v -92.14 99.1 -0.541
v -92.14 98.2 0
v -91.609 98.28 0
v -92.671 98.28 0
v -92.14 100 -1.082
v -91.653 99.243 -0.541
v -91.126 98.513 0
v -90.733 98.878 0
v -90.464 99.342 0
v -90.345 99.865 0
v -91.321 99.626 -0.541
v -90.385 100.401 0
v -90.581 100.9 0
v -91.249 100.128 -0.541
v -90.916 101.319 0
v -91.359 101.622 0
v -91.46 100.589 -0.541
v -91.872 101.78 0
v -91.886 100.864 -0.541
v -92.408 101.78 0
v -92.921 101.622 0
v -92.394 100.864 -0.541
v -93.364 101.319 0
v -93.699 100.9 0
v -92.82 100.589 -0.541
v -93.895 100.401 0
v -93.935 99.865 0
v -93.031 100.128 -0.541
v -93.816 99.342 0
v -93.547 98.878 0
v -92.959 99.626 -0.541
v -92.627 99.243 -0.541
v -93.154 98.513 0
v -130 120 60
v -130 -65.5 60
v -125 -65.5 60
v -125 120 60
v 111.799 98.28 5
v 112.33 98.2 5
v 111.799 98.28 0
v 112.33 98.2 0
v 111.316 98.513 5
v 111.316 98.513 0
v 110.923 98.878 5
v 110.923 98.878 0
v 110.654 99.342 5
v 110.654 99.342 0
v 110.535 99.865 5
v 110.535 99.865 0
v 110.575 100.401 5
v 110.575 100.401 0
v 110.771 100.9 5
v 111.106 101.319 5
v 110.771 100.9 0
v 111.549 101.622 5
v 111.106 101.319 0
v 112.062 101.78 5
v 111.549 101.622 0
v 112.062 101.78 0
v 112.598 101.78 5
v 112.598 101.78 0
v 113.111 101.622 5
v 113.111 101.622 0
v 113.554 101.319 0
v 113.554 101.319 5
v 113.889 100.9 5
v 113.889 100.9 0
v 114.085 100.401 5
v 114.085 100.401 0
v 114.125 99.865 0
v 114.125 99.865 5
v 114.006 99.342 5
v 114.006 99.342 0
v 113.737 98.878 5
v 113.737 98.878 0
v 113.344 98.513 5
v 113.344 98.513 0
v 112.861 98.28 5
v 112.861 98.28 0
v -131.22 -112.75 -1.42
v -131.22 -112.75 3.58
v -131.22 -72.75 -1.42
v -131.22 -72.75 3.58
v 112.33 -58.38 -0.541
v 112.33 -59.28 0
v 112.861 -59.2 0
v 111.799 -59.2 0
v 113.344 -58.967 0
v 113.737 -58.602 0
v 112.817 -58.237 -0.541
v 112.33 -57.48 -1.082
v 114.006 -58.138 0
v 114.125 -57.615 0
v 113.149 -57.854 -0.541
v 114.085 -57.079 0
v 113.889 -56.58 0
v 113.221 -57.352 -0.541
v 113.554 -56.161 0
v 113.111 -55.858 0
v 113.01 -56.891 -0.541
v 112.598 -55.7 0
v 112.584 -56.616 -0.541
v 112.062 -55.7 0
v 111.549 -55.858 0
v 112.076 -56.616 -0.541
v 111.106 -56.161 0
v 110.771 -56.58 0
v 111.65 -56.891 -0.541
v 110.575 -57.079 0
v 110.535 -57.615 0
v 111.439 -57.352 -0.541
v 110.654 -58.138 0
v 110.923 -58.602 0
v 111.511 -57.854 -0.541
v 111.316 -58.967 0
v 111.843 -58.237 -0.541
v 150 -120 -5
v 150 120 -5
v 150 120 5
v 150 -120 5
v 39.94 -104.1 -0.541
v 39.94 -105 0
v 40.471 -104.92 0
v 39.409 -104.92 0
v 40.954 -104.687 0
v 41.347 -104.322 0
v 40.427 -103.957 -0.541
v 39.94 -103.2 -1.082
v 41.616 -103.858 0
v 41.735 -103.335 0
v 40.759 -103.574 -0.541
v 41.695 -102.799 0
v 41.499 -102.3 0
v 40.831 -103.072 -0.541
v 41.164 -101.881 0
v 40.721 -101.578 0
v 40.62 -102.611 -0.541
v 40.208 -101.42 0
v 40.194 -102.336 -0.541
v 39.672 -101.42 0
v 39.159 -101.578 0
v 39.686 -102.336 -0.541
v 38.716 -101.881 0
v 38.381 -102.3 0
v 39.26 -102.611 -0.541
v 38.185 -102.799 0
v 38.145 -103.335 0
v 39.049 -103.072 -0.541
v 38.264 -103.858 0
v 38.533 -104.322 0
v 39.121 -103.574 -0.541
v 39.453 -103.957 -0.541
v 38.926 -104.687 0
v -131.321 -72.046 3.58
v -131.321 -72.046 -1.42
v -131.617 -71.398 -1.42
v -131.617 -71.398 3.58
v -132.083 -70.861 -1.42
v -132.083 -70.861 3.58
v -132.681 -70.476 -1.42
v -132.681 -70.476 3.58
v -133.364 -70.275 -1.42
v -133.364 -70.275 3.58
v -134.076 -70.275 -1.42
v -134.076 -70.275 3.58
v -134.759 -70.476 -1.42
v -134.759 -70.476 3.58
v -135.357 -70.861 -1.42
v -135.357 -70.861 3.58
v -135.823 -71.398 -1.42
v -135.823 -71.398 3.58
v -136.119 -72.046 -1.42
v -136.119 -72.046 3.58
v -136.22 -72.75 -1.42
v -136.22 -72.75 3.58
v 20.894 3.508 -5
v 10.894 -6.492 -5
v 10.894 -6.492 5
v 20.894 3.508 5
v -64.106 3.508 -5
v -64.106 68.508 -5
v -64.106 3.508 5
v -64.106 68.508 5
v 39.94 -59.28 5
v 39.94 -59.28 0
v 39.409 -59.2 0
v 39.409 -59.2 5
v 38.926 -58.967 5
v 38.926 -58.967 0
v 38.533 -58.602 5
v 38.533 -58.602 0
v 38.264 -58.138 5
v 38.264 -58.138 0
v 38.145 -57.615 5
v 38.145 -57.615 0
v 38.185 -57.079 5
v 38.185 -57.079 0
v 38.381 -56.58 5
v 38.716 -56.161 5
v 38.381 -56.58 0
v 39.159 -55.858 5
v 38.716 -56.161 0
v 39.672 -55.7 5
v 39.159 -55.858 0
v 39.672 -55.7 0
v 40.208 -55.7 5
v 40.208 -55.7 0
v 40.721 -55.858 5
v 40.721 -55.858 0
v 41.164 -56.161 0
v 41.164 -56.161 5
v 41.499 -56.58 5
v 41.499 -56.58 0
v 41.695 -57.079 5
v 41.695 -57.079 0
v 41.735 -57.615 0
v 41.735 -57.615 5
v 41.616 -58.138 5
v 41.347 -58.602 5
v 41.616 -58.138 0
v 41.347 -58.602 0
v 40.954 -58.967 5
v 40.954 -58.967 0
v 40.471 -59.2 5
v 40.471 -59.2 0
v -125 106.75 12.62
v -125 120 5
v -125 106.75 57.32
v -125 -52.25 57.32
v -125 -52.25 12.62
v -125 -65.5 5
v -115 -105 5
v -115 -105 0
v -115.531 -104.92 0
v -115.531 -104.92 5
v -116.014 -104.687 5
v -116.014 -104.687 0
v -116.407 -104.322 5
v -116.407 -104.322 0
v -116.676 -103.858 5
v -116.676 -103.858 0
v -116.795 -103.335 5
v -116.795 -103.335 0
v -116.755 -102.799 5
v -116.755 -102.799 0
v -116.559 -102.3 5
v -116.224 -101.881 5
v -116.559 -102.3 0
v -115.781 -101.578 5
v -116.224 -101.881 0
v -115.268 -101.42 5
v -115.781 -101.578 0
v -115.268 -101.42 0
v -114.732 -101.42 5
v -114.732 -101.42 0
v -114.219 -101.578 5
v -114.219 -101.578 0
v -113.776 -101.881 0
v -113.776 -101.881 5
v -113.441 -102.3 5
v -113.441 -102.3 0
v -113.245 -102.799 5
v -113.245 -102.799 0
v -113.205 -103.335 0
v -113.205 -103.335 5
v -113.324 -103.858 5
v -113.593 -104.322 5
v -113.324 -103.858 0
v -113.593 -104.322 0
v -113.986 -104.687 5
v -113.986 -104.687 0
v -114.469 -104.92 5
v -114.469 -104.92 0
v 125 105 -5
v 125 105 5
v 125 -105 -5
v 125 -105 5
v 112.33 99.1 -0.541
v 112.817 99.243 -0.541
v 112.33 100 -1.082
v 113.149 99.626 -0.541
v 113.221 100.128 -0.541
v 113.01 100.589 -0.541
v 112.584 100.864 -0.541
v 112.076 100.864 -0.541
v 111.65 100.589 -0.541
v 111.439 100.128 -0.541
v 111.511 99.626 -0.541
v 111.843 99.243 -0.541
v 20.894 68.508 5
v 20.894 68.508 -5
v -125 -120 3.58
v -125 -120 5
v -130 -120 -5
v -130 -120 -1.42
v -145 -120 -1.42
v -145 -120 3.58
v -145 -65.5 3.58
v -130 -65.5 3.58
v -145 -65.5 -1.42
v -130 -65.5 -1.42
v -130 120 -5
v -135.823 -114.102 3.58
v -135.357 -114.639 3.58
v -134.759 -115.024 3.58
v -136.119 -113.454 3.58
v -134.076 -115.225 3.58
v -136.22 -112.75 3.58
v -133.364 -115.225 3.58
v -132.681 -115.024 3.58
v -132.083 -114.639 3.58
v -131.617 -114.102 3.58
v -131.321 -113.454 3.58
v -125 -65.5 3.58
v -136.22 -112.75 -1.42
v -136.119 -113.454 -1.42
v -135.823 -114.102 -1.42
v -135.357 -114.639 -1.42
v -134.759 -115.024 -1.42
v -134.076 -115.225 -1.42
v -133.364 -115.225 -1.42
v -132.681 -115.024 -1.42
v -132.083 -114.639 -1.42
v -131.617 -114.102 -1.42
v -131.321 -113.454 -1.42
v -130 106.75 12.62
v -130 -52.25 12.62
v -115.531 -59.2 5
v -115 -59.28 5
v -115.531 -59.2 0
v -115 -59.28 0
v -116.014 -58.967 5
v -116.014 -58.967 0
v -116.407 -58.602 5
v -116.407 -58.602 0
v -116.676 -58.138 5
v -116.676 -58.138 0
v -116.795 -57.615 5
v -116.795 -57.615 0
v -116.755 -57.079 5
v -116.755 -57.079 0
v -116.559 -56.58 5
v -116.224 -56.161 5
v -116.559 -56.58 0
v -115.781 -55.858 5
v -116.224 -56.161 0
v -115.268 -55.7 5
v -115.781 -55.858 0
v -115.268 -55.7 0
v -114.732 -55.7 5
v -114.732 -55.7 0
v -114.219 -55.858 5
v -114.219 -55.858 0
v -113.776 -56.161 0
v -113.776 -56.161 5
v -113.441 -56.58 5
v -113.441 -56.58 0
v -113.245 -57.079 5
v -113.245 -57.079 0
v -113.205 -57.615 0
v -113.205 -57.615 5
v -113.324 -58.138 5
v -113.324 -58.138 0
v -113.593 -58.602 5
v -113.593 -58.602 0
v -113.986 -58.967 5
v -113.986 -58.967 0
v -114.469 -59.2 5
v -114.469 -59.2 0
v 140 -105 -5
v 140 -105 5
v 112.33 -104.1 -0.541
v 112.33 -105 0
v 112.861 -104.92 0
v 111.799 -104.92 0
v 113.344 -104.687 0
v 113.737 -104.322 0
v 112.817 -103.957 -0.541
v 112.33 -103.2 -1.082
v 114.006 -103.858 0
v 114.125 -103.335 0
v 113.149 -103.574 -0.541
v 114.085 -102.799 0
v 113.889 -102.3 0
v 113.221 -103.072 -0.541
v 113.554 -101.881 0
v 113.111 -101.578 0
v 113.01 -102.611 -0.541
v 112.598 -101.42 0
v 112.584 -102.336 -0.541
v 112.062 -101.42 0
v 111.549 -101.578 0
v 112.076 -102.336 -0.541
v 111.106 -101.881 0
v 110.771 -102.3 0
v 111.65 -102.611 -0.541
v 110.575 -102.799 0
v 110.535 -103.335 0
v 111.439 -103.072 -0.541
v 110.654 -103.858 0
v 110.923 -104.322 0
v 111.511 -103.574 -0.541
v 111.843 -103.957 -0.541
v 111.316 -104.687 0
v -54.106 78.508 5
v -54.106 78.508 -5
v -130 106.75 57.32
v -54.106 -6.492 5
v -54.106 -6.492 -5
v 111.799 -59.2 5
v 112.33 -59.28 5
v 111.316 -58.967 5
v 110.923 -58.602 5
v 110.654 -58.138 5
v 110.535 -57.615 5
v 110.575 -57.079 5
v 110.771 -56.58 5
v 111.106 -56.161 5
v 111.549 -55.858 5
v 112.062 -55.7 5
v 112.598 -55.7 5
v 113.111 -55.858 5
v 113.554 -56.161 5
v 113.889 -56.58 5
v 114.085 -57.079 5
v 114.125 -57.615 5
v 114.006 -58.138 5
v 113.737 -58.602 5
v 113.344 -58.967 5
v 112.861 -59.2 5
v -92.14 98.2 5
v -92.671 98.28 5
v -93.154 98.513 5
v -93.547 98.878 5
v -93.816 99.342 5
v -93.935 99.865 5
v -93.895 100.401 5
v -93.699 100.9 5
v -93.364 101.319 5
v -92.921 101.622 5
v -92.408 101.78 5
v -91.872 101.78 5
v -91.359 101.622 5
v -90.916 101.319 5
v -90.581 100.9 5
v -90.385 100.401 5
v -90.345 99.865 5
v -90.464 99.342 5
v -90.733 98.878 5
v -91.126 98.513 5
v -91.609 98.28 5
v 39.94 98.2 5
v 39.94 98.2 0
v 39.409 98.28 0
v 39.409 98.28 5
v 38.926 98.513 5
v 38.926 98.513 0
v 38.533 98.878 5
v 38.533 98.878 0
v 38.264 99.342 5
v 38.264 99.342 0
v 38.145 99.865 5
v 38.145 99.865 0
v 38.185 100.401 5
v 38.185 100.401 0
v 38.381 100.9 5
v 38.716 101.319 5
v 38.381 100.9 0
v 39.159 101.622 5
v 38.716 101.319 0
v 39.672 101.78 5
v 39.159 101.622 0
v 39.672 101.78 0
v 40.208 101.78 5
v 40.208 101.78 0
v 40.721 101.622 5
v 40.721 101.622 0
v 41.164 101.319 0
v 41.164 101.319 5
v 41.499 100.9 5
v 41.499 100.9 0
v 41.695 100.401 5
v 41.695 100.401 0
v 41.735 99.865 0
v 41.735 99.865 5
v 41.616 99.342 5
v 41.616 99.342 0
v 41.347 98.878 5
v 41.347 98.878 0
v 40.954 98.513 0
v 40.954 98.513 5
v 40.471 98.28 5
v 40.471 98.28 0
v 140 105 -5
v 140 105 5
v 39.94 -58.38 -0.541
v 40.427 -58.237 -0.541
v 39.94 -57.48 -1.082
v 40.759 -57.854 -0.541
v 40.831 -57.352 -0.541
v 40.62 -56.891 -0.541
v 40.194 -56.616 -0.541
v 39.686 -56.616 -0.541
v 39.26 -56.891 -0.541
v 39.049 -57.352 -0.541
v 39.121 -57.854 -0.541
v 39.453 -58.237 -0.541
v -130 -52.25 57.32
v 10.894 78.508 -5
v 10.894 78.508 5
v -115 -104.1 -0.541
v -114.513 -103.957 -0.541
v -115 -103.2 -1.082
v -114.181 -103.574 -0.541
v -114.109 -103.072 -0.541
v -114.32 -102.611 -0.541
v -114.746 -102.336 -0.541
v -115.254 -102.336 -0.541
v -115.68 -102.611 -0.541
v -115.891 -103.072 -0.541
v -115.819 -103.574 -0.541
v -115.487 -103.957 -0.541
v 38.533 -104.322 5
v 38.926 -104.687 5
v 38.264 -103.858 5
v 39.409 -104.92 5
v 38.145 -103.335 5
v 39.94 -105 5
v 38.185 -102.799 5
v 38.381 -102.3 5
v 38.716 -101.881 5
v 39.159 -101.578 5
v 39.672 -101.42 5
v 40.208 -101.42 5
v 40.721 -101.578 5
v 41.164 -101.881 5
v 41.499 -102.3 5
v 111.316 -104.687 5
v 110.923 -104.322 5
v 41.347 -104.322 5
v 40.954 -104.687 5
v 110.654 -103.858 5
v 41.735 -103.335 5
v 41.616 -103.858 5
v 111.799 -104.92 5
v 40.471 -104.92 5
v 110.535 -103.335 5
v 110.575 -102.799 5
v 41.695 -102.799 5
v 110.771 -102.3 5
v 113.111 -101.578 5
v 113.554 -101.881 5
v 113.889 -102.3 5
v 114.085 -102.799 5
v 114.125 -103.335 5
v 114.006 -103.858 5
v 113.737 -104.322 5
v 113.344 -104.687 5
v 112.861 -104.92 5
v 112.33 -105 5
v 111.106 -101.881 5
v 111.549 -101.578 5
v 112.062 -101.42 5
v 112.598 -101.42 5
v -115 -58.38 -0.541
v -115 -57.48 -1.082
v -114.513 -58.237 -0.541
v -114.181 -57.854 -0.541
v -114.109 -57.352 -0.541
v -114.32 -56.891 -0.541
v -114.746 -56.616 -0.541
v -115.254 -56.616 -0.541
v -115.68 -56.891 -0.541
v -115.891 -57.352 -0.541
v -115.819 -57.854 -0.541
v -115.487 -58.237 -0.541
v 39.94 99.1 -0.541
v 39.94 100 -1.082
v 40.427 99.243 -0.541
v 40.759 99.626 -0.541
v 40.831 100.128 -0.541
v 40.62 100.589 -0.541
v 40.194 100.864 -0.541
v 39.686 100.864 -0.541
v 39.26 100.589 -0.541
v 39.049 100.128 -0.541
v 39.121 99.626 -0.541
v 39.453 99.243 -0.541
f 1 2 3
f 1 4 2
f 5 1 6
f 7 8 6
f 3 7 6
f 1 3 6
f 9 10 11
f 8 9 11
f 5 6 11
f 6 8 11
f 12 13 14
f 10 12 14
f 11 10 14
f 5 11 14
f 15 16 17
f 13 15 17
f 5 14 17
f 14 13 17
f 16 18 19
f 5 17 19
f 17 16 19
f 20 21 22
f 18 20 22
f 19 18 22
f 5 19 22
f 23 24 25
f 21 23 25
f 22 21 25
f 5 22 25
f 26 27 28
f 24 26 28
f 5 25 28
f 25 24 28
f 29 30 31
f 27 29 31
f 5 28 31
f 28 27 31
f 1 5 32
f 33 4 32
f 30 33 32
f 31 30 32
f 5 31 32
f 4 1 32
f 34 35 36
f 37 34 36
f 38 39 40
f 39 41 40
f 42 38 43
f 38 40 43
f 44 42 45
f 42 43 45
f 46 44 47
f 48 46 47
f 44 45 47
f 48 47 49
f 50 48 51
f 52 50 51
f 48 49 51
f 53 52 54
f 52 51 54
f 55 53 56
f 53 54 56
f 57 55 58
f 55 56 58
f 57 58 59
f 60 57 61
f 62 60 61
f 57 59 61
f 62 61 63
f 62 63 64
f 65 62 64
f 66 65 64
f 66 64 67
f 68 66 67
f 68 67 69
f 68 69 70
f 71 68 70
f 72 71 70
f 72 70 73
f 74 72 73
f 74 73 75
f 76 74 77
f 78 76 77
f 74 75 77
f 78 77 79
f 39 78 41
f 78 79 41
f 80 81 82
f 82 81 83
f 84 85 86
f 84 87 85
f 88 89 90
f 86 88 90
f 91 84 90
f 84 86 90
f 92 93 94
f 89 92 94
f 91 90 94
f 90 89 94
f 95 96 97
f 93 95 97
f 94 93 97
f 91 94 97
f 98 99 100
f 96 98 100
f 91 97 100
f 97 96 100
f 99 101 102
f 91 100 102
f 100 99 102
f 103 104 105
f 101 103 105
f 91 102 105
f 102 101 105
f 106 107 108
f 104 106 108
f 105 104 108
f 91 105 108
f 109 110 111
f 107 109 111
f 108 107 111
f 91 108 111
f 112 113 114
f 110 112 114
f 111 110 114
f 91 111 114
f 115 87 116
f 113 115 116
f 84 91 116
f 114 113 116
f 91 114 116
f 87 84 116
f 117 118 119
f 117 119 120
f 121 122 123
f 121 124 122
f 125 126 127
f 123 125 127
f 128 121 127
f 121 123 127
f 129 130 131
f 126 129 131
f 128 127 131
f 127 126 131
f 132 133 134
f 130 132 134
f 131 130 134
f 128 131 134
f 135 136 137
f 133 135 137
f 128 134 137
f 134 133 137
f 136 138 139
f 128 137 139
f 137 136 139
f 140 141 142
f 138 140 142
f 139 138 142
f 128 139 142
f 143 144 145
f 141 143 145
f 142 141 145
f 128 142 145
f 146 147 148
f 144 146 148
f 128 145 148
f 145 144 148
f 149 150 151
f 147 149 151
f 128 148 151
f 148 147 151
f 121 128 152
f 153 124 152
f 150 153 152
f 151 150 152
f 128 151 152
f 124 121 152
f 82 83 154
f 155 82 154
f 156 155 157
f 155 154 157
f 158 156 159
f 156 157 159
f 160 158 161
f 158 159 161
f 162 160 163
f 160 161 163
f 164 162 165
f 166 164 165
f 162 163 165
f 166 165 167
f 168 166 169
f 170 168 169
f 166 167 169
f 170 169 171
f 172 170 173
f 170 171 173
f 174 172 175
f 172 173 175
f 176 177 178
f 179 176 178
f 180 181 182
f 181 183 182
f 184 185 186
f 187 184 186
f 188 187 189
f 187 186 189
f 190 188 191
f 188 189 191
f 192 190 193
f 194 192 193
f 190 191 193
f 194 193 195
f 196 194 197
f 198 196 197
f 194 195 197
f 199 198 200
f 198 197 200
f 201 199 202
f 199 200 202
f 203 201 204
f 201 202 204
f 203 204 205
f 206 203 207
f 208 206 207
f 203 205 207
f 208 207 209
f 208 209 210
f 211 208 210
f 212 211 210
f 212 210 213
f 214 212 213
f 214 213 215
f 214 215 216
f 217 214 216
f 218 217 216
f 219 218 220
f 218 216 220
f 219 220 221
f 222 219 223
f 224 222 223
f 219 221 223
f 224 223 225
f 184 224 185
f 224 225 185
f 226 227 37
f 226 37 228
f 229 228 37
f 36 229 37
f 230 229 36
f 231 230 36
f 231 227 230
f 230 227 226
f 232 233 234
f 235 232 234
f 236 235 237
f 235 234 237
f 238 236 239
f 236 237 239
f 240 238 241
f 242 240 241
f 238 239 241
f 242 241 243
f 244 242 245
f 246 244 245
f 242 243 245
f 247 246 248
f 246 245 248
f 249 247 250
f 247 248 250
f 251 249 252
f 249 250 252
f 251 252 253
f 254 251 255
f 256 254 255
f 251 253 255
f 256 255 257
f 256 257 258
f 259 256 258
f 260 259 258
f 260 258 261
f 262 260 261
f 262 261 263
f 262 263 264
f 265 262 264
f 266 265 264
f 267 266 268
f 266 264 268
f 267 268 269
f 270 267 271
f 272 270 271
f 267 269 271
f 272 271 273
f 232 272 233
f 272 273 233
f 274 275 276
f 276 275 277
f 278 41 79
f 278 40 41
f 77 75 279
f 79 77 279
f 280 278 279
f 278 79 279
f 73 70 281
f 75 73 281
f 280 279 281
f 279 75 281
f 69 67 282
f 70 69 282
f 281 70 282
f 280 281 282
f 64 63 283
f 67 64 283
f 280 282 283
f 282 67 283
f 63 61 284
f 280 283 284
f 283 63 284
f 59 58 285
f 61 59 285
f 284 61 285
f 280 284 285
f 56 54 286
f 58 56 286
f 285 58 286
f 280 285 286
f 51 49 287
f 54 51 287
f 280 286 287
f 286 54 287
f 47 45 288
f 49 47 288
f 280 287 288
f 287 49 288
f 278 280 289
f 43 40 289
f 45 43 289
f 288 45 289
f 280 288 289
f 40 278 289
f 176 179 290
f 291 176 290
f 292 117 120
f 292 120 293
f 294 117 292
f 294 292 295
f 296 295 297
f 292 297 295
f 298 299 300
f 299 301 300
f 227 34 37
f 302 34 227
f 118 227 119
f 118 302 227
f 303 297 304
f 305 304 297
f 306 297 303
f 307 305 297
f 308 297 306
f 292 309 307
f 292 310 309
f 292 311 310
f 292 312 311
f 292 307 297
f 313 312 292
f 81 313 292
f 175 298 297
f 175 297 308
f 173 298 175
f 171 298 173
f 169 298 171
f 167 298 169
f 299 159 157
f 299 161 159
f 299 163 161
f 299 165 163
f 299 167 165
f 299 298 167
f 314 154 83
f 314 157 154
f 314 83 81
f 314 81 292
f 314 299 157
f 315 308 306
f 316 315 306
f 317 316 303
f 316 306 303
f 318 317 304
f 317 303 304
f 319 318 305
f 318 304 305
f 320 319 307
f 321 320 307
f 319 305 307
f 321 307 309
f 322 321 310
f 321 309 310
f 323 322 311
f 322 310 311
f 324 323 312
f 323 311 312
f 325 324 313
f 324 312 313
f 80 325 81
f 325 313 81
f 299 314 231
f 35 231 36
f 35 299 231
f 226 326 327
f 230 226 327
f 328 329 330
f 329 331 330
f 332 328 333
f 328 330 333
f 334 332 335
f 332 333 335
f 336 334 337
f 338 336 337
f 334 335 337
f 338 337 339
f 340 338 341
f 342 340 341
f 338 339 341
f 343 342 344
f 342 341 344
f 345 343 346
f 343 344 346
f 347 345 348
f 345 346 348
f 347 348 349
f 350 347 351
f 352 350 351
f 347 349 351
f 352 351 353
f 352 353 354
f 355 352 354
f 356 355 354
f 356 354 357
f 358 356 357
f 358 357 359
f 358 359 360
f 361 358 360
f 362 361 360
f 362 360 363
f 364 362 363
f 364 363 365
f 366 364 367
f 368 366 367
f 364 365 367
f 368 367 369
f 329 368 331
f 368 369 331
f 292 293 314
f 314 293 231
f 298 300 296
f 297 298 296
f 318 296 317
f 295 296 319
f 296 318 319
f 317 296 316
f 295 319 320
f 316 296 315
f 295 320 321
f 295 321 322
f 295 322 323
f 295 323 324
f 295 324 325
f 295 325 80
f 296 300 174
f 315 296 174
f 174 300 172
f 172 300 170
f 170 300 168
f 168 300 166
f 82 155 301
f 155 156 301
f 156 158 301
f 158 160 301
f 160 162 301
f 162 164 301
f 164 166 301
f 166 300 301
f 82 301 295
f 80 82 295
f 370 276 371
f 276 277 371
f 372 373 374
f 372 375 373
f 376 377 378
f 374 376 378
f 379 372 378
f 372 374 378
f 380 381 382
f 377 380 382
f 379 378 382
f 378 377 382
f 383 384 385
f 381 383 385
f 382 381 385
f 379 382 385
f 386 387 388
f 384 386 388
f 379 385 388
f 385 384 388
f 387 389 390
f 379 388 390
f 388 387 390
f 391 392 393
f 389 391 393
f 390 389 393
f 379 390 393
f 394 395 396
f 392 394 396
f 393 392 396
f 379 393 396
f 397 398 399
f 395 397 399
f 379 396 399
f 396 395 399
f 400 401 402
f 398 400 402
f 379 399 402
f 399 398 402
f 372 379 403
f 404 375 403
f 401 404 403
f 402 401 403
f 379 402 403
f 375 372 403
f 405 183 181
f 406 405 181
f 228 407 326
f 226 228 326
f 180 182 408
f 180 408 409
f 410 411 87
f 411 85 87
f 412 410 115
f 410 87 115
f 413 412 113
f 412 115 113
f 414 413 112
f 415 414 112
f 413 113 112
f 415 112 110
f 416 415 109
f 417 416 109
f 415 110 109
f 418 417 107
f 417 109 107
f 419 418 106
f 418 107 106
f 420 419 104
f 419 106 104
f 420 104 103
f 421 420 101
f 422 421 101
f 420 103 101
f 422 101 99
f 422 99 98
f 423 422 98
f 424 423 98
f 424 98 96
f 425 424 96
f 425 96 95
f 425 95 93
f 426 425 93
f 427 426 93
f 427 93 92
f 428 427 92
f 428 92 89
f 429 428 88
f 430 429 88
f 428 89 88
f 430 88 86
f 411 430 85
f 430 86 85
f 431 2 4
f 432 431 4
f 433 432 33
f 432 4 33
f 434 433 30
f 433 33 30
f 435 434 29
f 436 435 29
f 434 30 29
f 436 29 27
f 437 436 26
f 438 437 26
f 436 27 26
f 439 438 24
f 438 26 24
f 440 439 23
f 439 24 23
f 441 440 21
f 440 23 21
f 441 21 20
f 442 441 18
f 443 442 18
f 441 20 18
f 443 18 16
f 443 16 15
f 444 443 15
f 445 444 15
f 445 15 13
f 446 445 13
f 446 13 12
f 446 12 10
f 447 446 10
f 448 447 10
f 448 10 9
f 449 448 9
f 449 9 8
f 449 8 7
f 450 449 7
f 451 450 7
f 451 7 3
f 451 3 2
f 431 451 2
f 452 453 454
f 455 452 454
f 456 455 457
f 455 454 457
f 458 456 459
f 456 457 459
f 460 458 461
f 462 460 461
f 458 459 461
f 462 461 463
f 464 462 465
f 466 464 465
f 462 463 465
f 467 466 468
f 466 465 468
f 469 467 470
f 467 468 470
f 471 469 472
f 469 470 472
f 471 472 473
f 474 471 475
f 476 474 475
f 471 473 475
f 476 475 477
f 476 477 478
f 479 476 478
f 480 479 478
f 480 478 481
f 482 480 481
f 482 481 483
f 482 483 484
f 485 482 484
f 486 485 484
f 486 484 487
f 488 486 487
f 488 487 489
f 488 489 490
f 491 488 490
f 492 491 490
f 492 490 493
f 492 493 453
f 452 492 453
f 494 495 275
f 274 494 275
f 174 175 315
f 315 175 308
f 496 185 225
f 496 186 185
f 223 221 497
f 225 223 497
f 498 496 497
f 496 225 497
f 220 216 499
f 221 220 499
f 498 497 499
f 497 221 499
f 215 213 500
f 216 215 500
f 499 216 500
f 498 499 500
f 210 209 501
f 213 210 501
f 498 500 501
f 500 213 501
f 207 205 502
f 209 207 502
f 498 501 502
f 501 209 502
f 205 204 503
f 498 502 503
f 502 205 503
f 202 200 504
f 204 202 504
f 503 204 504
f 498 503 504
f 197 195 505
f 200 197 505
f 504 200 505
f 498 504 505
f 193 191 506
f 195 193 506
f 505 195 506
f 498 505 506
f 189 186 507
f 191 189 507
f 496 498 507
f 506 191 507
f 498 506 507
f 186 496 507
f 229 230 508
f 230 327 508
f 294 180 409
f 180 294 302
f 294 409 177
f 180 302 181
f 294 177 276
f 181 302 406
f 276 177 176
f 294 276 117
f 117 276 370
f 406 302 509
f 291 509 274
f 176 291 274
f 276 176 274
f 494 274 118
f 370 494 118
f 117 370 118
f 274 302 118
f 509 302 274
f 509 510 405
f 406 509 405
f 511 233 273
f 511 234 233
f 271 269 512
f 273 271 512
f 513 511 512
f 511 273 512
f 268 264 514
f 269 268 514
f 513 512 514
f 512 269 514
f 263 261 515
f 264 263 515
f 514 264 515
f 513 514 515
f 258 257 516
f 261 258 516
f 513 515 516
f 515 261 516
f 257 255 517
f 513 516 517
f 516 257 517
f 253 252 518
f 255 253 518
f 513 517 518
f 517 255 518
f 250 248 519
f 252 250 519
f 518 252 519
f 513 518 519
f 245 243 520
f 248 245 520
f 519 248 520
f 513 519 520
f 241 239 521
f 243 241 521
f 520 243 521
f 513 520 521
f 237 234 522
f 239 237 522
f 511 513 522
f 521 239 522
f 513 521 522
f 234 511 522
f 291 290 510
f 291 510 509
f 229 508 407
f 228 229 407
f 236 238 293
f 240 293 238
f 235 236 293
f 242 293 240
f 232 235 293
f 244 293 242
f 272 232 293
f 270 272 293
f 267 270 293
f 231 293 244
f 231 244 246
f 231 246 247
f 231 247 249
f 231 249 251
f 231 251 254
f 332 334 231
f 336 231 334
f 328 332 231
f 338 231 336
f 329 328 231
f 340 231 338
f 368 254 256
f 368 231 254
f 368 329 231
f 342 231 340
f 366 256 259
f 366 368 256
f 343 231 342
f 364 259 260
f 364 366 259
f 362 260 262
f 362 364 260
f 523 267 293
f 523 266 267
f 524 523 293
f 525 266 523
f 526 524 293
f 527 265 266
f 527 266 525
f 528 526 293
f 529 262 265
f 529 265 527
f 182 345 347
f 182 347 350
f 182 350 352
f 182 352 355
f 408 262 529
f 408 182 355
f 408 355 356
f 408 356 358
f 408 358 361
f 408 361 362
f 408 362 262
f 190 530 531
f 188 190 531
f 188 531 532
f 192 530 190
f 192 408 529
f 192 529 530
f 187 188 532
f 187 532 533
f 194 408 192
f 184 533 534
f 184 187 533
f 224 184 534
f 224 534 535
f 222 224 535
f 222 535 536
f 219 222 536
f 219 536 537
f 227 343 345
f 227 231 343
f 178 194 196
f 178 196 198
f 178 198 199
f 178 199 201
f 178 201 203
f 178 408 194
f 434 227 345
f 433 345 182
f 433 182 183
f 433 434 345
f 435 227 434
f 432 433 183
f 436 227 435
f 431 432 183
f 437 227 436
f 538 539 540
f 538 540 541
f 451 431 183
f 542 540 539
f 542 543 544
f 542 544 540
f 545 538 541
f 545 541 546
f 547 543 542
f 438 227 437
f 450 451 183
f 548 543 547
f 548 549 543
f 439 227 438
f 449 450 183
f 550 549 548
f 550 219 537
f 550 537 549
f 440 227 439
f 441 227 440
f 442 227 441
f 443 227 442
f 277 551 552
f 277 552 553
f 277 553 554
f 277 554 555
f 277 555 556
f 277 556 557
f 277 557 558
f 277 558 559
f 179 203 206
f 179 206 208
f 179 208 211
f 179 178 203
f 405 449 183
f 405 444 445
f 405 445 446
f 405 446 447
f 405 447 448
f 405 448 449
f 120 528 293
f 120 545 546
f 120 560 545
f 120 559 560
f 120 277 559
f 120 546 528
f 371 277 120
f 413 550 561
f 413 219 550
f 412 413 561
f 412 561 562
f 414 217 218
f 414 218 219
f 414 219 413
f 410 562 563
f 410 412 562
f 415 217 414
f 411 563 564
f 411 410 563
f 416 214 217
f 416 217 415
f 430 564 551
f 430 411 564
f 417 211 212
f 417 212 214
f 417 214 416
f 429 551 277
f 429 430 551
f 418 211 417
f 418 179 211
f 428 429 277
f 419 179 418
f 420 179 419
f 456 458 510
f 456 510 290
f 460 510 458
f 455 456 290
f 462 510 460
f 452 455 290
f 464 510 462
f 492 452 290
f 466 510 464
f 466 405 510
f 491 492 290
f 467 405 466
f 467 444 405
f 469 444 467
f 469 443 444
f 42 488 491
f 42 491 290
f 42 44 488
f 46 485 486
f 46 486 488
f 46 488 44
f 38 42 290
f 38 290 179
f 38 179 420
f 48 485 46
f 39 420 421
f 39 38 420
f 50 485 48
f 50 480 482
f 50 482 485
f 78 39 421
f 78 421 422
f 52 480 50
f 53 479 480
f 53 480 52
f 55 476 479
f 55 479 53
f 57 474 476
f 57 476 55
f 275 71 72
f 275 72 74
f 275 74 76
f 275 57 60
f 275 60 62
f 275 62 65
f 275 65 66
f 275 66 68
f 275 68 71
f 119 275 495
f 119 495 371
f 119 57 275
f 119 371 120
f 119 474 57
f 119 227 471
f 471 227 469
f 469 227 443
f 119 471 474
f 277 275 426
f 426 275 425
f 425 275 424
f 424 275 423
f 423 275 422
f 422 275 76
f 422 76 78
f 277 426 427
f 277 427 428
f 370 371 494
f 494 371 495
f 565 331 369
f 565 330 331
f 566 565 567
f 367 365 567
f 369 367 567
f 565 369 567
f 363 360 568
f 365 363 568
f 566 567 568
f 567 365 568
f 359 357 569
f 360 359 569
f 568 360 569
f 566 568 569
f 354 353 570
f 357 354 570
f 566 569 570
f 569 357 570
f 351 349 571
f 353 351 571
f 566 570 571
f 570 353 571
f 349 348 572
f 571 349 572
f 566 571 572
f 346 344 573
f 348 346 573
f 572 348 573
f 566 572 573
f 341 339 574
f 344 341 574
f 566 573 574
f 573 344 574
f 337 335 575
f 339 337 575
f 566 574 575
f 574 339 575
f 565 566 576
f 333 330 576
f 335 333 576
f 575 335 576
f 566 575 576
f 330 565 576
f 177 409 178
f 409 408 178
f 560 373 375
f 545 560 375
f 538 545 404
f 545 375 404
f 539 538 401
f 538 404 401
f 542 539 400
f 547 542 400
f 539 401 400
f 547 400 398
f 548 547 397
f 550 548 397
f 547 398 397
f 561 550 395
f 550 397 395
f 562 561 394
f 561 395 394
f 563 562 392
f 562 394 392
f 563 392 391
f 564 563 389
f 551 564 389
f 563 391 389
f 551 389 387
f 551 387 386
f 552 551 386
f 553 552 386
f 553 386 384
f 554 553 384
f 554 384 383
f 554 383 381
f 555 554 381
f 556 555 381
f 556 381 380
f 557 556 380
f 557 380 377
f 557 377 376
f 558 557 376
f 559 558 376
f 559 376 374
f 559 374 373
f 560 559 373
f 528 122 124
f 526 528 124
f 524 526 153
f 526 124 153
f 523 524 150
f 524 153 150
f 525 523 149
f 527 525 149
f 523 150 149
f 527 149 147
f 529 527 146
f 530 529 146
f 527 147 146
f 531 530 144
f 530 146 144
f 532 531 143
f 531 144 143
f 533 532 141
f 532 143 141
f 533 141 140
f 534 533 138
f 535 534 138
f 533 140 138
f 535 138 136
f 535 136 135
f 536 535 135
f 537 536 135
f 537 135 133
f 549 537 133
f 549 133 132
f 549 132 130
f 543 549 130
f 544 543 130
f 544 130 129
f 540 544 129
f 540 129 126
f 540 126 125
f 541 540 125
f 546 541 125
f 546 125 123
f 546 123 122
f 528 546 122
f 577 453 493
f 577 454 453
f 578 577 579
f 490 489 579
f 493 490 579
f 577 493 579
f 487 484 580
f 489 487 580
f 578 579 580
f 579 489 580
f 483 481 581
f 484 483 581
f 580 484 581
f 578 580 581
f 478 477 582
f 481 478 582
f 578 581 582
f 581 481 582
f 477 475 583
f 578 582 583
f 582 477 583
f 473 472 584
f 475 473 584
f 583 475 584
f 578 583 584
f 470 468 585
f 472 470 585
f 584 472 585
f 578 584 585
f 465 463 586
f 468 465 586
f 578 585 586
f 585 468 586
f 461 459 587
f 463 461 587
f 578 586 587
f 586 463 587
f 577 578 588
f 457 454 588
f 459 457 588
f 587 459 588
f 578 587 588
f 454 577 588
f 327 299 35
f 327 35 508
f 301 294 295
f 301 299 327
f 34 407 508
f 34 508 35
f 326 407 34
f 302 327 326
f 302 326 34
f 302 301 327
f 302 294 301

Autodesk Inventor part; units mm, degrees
ref_plane "YZ Plane" through (0, 0, 0) normal (1, 0, 0) x (0, 1, 0)
ref_plane "XZ Plane" through (0, 0, 0) normal (0, 1, 0) x (-1, 0, 0)
ref_plane "XY Plane" through (0, 0, 0) normal (0, 0, 1) x (1, 0, 0)
sketch "Sketch1" plane through (0, 0, 0) normal (0, 0, 1) x (1, 0, 0)
  line L0 (-125, 120) -> (125, 120)
  line L1 (125, 120) -> (125, -120)
  line L2 (125, -120) -> (-125, -120)
  line L3 (-125, -120) -> (-125, 120)
  point P0 (0, 0)
  dimension "d0" = 250
  dimension "d1" = 240
  dimension "d2" = 125
  dimension "d3" = 120
extrude "Extrusion1" add sketch "Sketch1" along normal mid plane 10
sketch "Sketch5" plane through (0, 0, 5) normal (0, 0, 1) x (1, 0, 0)
  line L0 (-115, 100) -> (-115, -103.2)
  line L1 (-92.14, 100) -> (-92.14, -103.2)
  line L2 (39.94, 100) -> (39.94, -103.2)
  line L3 (112.33, 100) -> (112.33, -103.2)
  line L4 (-92.14, 100) -> (112.33, 100)
  line L5 (-115, -57.48) -> (39.94, -57.48)
  line L6 (112.33, -57.48) -> (39.94, -57.48)
  line L7 (-115, -103.2) -> (39.94, -103.2)
  line L8 (112.33, -103.2) -> (39.94, -103.2)
  line L9 (-115, 100) -> (-92.14, 100)
  line L10 (-125, 120) -> (-125, -120) projected
  line L11 (125, 120) -> (-125, 120) projected
  point P0 (0, 0)
  dimension "d25" = 10
  dimension "d26" = 22.86
  dimension "d27" = 72.39
  dimension "d28" = 132.08
  dimension "d29" = 45.72
  dimension "d30" = 157.48
  dimension "d38" = 20
hole "Hole2" at (-92.14, 100, 5) at (39.94, 100, 5) at (112.33, 100, 5) at (112.33, -57.48, 5) at (39.94, -57.48, 5) at (39.94, -103.2, 5) at (112.33, -103.2, 5) at (-115, -57.48, 5) at (-115, -103.2, 5) direction (0, 0, -1) diameter 3.6 depth 5 tip angle 118
thicken "Thicken1" operation add thickness 5 both sides no extend neighbours yes toward (-1, 0, 0) faces at (-125, 40, -1.6667)
sketch "Sketch11" plane through (0, 0, 5) normal (0, 0, 1) x (1, 0, 0)
  line L0 (125, 120) -> (-130, 120) projected
  line L1 (-130, -120) -> (125, -120) projected
  line L2 (-130, 120) -> (-125, 120)
  line L3 (-125, 120) -> (-125, -120)
  line L4 (-125, -120) -> (-130, -120)
  line L5 (-130, -120) -> (-130, 120)
  point P0 (0, 0)
  dimension "d70" = 5
extrude "Extrusion5" add sketch "Sketch11" along normal blind 55
sketch "Sketch12" plane through (-130, -120, -5) normal (-1, 0, 0) x (0, 0, 1)
  line L0 (10, 221.8) -> (10, 218.2) projected
  line L1 (10, 220) -> (65, 220)
  line L2 (65, 240) -> (65, 0) projected
  line L3 (62.32, 226.75) -> (17.62, 226.75)
  line L4 (17.62, 226.75) -> (17.62, 67.75)
  line L5 (17.62, 67.75) -> (62.32, 67.75)
  line L6 (62.32, 67.75) -> (62.32, 226.75)
  line L7 (10, 240) -> (10, 0) projected
  line L8 (10, 0) -> (10, 240) projected
  line L9 (65, 0) -> (65, 240) projected
  line L10 (10, 54.5) -> (65, 54.5)
  line L11 (65, 54.5) -> (65, 0)
  line L12 (65, 0) -> (10, 0)
  line L13 (10, 0) -> (10, 54.5)
  point P0 (10, 0)
  point P1 (65, 54.5)
  point P2 (10, 54.5)
  dimension "d75" = 44.7
  dimension "d76" = 159
  dimension "d77" = 6.75
  dimension "d78" = 7.62
  dimension "d79" = 13.25
extrude "Extrusion6" cut sketch "Sketch12" against normal up to surface (5 mm away) contours L4 L3 L6 L1 | L1 L6 L5 L4 | L10 L2 L12 L7
ref_plane "Work Plane1" through (0, 0, -1.42) normal (0, 0, 1) x (1, 0, 0)
sketch "Sketch13" plane through (0, 0, -1.42) normal (0, 0, 1) x (1, 0, 0)
  line L0 (-130, -120) -> (-130, -65.5) projected
  line L1 (-130, -65.5) -> (-145, -65.5)
  line L2 (-145, -65.5) -> (-145, -120)
  line L3 (-145, -120) -> (-130, -120)
  line L4 (-130, -120) -> (-130, -65.5)
  point P0 (0, 0)
  dimension "d83" = 15
  dimension "d86" = 54.5
extrude "Extrusion7" add sketch "Sketch13" along normal blind 5
sketch "Sketch14" plane through (0, 0, 3.58) normal (0, 0, 1) x (1, 0, 0)
  line L0 (-145, -120) -> (-130, -120) projected
  line L1 (-131.22, -72.75) -> (-136.22, -72.75)
  line L2 (-136.22, -72.75) -> (-136.22, -112.75)
  line L3 (-136.22, -112.75) -> (-131.22, -112.75)
  line L4 (-131.22, -112.75) -> (-131.22, -72.75)
  line L5 (-130, -120) -> (-130, -65.5) projected
  line L6 (-125, 120) -> (-125, -65.5) projected
  circle A0 centre (-133.72, -72.75) radius 2.5
  circle A1 centre (-133.72, -112.75) radius 2.5
  point P0 (0, 0)
  point P1 (-137.2605, -92.75)
  dimension "d87" = 27.25
  dimension "d88" = 5
  dimension "d89" = 40
  dimension "d90" = 20
  dimension "d92" = 6.22
extrude "Extrusion8" cut sketch "Sketch14" against normal up to surface (5 mm away)
sketch "Sketch15" plane through (0, 0, 5) normal (0, 0, 1) x (1, 0, 0)
  line L0 (-125, 120) -> (-125, -65.5) projected
  line L1 (-145, -120) -> (-130, -120) projected
  line L2 (-125, -65.5) -> (-130, -65.5)
  line L3 (-130, -65.5) -> (-130, -120)
  line L4 (-130, -120) -> (-125, -120)
  line L5 (-125, -120) -> (-125, -65.5)
  point P0 (0, 0)
extrude "Extrusion9" cut sketch "Sketch15" against normal blind 1.42
thicken "Thicken2" operation add thickness 25 both sides no extend neighbours yes toward (1, 0, 0) faces at (125, -40, -1.6667)
sketch "Sketch18" plane through (0, 0, 5) normal (0, 0, 1) x (1, 0, 0)
  line L0 (150, 120) -> (-125, 120) projected
  line L1 (140, 105) -> (125, 105)
  line L2 (125, 105) -> (125, -105)
  line L3 (125, -105) -> (140, -105)
  line L4 (140, -105) -> (140, 105)
  line L5 (150, -120) -> (150, 120) projected
  line L6 (20.8941, 78.5076) -> (-64.1059, 78.5076)
  line L7 (-64.1059, 78.5076) -> (-64.1059, -6.4924)
  line L8 (-64.1059, -6.4924) -> (20.8941, -6.4924)
  line L9 (20.8941, -6.4924) -> (20.8941, 78.5076)
  point P0 (0, 0)
  point P1 (139.9053, 0)
  dimension "d102" = 120
  dimension "d103" = 15
  dimension "d104" = 210
  dimension "d105" = 105
  dimension "d106" = 10
  dimension "d107" = 85
  dimension "d108" = 85
extrude "Extrusion11" cut sketch "Sketch18" against normal up to surface (10 mm away)
chamfer "Chamfer4" distance 10 angle 45 4 edges at (-64.1059, 78.5076, 0) (-64.1059, -6.4924, 0) (20.8941, -6.4924, 0) (20.8941, 78.5076, 0)
equation "\"d2\" = 0.5 * d0"
equation "\"d3\" = 0.5 * d1"
equation "\"d87\" = 0.5 * d86"
equation "\"d90\" = 0.5 * d89"
properties part number "_3DPrint"
